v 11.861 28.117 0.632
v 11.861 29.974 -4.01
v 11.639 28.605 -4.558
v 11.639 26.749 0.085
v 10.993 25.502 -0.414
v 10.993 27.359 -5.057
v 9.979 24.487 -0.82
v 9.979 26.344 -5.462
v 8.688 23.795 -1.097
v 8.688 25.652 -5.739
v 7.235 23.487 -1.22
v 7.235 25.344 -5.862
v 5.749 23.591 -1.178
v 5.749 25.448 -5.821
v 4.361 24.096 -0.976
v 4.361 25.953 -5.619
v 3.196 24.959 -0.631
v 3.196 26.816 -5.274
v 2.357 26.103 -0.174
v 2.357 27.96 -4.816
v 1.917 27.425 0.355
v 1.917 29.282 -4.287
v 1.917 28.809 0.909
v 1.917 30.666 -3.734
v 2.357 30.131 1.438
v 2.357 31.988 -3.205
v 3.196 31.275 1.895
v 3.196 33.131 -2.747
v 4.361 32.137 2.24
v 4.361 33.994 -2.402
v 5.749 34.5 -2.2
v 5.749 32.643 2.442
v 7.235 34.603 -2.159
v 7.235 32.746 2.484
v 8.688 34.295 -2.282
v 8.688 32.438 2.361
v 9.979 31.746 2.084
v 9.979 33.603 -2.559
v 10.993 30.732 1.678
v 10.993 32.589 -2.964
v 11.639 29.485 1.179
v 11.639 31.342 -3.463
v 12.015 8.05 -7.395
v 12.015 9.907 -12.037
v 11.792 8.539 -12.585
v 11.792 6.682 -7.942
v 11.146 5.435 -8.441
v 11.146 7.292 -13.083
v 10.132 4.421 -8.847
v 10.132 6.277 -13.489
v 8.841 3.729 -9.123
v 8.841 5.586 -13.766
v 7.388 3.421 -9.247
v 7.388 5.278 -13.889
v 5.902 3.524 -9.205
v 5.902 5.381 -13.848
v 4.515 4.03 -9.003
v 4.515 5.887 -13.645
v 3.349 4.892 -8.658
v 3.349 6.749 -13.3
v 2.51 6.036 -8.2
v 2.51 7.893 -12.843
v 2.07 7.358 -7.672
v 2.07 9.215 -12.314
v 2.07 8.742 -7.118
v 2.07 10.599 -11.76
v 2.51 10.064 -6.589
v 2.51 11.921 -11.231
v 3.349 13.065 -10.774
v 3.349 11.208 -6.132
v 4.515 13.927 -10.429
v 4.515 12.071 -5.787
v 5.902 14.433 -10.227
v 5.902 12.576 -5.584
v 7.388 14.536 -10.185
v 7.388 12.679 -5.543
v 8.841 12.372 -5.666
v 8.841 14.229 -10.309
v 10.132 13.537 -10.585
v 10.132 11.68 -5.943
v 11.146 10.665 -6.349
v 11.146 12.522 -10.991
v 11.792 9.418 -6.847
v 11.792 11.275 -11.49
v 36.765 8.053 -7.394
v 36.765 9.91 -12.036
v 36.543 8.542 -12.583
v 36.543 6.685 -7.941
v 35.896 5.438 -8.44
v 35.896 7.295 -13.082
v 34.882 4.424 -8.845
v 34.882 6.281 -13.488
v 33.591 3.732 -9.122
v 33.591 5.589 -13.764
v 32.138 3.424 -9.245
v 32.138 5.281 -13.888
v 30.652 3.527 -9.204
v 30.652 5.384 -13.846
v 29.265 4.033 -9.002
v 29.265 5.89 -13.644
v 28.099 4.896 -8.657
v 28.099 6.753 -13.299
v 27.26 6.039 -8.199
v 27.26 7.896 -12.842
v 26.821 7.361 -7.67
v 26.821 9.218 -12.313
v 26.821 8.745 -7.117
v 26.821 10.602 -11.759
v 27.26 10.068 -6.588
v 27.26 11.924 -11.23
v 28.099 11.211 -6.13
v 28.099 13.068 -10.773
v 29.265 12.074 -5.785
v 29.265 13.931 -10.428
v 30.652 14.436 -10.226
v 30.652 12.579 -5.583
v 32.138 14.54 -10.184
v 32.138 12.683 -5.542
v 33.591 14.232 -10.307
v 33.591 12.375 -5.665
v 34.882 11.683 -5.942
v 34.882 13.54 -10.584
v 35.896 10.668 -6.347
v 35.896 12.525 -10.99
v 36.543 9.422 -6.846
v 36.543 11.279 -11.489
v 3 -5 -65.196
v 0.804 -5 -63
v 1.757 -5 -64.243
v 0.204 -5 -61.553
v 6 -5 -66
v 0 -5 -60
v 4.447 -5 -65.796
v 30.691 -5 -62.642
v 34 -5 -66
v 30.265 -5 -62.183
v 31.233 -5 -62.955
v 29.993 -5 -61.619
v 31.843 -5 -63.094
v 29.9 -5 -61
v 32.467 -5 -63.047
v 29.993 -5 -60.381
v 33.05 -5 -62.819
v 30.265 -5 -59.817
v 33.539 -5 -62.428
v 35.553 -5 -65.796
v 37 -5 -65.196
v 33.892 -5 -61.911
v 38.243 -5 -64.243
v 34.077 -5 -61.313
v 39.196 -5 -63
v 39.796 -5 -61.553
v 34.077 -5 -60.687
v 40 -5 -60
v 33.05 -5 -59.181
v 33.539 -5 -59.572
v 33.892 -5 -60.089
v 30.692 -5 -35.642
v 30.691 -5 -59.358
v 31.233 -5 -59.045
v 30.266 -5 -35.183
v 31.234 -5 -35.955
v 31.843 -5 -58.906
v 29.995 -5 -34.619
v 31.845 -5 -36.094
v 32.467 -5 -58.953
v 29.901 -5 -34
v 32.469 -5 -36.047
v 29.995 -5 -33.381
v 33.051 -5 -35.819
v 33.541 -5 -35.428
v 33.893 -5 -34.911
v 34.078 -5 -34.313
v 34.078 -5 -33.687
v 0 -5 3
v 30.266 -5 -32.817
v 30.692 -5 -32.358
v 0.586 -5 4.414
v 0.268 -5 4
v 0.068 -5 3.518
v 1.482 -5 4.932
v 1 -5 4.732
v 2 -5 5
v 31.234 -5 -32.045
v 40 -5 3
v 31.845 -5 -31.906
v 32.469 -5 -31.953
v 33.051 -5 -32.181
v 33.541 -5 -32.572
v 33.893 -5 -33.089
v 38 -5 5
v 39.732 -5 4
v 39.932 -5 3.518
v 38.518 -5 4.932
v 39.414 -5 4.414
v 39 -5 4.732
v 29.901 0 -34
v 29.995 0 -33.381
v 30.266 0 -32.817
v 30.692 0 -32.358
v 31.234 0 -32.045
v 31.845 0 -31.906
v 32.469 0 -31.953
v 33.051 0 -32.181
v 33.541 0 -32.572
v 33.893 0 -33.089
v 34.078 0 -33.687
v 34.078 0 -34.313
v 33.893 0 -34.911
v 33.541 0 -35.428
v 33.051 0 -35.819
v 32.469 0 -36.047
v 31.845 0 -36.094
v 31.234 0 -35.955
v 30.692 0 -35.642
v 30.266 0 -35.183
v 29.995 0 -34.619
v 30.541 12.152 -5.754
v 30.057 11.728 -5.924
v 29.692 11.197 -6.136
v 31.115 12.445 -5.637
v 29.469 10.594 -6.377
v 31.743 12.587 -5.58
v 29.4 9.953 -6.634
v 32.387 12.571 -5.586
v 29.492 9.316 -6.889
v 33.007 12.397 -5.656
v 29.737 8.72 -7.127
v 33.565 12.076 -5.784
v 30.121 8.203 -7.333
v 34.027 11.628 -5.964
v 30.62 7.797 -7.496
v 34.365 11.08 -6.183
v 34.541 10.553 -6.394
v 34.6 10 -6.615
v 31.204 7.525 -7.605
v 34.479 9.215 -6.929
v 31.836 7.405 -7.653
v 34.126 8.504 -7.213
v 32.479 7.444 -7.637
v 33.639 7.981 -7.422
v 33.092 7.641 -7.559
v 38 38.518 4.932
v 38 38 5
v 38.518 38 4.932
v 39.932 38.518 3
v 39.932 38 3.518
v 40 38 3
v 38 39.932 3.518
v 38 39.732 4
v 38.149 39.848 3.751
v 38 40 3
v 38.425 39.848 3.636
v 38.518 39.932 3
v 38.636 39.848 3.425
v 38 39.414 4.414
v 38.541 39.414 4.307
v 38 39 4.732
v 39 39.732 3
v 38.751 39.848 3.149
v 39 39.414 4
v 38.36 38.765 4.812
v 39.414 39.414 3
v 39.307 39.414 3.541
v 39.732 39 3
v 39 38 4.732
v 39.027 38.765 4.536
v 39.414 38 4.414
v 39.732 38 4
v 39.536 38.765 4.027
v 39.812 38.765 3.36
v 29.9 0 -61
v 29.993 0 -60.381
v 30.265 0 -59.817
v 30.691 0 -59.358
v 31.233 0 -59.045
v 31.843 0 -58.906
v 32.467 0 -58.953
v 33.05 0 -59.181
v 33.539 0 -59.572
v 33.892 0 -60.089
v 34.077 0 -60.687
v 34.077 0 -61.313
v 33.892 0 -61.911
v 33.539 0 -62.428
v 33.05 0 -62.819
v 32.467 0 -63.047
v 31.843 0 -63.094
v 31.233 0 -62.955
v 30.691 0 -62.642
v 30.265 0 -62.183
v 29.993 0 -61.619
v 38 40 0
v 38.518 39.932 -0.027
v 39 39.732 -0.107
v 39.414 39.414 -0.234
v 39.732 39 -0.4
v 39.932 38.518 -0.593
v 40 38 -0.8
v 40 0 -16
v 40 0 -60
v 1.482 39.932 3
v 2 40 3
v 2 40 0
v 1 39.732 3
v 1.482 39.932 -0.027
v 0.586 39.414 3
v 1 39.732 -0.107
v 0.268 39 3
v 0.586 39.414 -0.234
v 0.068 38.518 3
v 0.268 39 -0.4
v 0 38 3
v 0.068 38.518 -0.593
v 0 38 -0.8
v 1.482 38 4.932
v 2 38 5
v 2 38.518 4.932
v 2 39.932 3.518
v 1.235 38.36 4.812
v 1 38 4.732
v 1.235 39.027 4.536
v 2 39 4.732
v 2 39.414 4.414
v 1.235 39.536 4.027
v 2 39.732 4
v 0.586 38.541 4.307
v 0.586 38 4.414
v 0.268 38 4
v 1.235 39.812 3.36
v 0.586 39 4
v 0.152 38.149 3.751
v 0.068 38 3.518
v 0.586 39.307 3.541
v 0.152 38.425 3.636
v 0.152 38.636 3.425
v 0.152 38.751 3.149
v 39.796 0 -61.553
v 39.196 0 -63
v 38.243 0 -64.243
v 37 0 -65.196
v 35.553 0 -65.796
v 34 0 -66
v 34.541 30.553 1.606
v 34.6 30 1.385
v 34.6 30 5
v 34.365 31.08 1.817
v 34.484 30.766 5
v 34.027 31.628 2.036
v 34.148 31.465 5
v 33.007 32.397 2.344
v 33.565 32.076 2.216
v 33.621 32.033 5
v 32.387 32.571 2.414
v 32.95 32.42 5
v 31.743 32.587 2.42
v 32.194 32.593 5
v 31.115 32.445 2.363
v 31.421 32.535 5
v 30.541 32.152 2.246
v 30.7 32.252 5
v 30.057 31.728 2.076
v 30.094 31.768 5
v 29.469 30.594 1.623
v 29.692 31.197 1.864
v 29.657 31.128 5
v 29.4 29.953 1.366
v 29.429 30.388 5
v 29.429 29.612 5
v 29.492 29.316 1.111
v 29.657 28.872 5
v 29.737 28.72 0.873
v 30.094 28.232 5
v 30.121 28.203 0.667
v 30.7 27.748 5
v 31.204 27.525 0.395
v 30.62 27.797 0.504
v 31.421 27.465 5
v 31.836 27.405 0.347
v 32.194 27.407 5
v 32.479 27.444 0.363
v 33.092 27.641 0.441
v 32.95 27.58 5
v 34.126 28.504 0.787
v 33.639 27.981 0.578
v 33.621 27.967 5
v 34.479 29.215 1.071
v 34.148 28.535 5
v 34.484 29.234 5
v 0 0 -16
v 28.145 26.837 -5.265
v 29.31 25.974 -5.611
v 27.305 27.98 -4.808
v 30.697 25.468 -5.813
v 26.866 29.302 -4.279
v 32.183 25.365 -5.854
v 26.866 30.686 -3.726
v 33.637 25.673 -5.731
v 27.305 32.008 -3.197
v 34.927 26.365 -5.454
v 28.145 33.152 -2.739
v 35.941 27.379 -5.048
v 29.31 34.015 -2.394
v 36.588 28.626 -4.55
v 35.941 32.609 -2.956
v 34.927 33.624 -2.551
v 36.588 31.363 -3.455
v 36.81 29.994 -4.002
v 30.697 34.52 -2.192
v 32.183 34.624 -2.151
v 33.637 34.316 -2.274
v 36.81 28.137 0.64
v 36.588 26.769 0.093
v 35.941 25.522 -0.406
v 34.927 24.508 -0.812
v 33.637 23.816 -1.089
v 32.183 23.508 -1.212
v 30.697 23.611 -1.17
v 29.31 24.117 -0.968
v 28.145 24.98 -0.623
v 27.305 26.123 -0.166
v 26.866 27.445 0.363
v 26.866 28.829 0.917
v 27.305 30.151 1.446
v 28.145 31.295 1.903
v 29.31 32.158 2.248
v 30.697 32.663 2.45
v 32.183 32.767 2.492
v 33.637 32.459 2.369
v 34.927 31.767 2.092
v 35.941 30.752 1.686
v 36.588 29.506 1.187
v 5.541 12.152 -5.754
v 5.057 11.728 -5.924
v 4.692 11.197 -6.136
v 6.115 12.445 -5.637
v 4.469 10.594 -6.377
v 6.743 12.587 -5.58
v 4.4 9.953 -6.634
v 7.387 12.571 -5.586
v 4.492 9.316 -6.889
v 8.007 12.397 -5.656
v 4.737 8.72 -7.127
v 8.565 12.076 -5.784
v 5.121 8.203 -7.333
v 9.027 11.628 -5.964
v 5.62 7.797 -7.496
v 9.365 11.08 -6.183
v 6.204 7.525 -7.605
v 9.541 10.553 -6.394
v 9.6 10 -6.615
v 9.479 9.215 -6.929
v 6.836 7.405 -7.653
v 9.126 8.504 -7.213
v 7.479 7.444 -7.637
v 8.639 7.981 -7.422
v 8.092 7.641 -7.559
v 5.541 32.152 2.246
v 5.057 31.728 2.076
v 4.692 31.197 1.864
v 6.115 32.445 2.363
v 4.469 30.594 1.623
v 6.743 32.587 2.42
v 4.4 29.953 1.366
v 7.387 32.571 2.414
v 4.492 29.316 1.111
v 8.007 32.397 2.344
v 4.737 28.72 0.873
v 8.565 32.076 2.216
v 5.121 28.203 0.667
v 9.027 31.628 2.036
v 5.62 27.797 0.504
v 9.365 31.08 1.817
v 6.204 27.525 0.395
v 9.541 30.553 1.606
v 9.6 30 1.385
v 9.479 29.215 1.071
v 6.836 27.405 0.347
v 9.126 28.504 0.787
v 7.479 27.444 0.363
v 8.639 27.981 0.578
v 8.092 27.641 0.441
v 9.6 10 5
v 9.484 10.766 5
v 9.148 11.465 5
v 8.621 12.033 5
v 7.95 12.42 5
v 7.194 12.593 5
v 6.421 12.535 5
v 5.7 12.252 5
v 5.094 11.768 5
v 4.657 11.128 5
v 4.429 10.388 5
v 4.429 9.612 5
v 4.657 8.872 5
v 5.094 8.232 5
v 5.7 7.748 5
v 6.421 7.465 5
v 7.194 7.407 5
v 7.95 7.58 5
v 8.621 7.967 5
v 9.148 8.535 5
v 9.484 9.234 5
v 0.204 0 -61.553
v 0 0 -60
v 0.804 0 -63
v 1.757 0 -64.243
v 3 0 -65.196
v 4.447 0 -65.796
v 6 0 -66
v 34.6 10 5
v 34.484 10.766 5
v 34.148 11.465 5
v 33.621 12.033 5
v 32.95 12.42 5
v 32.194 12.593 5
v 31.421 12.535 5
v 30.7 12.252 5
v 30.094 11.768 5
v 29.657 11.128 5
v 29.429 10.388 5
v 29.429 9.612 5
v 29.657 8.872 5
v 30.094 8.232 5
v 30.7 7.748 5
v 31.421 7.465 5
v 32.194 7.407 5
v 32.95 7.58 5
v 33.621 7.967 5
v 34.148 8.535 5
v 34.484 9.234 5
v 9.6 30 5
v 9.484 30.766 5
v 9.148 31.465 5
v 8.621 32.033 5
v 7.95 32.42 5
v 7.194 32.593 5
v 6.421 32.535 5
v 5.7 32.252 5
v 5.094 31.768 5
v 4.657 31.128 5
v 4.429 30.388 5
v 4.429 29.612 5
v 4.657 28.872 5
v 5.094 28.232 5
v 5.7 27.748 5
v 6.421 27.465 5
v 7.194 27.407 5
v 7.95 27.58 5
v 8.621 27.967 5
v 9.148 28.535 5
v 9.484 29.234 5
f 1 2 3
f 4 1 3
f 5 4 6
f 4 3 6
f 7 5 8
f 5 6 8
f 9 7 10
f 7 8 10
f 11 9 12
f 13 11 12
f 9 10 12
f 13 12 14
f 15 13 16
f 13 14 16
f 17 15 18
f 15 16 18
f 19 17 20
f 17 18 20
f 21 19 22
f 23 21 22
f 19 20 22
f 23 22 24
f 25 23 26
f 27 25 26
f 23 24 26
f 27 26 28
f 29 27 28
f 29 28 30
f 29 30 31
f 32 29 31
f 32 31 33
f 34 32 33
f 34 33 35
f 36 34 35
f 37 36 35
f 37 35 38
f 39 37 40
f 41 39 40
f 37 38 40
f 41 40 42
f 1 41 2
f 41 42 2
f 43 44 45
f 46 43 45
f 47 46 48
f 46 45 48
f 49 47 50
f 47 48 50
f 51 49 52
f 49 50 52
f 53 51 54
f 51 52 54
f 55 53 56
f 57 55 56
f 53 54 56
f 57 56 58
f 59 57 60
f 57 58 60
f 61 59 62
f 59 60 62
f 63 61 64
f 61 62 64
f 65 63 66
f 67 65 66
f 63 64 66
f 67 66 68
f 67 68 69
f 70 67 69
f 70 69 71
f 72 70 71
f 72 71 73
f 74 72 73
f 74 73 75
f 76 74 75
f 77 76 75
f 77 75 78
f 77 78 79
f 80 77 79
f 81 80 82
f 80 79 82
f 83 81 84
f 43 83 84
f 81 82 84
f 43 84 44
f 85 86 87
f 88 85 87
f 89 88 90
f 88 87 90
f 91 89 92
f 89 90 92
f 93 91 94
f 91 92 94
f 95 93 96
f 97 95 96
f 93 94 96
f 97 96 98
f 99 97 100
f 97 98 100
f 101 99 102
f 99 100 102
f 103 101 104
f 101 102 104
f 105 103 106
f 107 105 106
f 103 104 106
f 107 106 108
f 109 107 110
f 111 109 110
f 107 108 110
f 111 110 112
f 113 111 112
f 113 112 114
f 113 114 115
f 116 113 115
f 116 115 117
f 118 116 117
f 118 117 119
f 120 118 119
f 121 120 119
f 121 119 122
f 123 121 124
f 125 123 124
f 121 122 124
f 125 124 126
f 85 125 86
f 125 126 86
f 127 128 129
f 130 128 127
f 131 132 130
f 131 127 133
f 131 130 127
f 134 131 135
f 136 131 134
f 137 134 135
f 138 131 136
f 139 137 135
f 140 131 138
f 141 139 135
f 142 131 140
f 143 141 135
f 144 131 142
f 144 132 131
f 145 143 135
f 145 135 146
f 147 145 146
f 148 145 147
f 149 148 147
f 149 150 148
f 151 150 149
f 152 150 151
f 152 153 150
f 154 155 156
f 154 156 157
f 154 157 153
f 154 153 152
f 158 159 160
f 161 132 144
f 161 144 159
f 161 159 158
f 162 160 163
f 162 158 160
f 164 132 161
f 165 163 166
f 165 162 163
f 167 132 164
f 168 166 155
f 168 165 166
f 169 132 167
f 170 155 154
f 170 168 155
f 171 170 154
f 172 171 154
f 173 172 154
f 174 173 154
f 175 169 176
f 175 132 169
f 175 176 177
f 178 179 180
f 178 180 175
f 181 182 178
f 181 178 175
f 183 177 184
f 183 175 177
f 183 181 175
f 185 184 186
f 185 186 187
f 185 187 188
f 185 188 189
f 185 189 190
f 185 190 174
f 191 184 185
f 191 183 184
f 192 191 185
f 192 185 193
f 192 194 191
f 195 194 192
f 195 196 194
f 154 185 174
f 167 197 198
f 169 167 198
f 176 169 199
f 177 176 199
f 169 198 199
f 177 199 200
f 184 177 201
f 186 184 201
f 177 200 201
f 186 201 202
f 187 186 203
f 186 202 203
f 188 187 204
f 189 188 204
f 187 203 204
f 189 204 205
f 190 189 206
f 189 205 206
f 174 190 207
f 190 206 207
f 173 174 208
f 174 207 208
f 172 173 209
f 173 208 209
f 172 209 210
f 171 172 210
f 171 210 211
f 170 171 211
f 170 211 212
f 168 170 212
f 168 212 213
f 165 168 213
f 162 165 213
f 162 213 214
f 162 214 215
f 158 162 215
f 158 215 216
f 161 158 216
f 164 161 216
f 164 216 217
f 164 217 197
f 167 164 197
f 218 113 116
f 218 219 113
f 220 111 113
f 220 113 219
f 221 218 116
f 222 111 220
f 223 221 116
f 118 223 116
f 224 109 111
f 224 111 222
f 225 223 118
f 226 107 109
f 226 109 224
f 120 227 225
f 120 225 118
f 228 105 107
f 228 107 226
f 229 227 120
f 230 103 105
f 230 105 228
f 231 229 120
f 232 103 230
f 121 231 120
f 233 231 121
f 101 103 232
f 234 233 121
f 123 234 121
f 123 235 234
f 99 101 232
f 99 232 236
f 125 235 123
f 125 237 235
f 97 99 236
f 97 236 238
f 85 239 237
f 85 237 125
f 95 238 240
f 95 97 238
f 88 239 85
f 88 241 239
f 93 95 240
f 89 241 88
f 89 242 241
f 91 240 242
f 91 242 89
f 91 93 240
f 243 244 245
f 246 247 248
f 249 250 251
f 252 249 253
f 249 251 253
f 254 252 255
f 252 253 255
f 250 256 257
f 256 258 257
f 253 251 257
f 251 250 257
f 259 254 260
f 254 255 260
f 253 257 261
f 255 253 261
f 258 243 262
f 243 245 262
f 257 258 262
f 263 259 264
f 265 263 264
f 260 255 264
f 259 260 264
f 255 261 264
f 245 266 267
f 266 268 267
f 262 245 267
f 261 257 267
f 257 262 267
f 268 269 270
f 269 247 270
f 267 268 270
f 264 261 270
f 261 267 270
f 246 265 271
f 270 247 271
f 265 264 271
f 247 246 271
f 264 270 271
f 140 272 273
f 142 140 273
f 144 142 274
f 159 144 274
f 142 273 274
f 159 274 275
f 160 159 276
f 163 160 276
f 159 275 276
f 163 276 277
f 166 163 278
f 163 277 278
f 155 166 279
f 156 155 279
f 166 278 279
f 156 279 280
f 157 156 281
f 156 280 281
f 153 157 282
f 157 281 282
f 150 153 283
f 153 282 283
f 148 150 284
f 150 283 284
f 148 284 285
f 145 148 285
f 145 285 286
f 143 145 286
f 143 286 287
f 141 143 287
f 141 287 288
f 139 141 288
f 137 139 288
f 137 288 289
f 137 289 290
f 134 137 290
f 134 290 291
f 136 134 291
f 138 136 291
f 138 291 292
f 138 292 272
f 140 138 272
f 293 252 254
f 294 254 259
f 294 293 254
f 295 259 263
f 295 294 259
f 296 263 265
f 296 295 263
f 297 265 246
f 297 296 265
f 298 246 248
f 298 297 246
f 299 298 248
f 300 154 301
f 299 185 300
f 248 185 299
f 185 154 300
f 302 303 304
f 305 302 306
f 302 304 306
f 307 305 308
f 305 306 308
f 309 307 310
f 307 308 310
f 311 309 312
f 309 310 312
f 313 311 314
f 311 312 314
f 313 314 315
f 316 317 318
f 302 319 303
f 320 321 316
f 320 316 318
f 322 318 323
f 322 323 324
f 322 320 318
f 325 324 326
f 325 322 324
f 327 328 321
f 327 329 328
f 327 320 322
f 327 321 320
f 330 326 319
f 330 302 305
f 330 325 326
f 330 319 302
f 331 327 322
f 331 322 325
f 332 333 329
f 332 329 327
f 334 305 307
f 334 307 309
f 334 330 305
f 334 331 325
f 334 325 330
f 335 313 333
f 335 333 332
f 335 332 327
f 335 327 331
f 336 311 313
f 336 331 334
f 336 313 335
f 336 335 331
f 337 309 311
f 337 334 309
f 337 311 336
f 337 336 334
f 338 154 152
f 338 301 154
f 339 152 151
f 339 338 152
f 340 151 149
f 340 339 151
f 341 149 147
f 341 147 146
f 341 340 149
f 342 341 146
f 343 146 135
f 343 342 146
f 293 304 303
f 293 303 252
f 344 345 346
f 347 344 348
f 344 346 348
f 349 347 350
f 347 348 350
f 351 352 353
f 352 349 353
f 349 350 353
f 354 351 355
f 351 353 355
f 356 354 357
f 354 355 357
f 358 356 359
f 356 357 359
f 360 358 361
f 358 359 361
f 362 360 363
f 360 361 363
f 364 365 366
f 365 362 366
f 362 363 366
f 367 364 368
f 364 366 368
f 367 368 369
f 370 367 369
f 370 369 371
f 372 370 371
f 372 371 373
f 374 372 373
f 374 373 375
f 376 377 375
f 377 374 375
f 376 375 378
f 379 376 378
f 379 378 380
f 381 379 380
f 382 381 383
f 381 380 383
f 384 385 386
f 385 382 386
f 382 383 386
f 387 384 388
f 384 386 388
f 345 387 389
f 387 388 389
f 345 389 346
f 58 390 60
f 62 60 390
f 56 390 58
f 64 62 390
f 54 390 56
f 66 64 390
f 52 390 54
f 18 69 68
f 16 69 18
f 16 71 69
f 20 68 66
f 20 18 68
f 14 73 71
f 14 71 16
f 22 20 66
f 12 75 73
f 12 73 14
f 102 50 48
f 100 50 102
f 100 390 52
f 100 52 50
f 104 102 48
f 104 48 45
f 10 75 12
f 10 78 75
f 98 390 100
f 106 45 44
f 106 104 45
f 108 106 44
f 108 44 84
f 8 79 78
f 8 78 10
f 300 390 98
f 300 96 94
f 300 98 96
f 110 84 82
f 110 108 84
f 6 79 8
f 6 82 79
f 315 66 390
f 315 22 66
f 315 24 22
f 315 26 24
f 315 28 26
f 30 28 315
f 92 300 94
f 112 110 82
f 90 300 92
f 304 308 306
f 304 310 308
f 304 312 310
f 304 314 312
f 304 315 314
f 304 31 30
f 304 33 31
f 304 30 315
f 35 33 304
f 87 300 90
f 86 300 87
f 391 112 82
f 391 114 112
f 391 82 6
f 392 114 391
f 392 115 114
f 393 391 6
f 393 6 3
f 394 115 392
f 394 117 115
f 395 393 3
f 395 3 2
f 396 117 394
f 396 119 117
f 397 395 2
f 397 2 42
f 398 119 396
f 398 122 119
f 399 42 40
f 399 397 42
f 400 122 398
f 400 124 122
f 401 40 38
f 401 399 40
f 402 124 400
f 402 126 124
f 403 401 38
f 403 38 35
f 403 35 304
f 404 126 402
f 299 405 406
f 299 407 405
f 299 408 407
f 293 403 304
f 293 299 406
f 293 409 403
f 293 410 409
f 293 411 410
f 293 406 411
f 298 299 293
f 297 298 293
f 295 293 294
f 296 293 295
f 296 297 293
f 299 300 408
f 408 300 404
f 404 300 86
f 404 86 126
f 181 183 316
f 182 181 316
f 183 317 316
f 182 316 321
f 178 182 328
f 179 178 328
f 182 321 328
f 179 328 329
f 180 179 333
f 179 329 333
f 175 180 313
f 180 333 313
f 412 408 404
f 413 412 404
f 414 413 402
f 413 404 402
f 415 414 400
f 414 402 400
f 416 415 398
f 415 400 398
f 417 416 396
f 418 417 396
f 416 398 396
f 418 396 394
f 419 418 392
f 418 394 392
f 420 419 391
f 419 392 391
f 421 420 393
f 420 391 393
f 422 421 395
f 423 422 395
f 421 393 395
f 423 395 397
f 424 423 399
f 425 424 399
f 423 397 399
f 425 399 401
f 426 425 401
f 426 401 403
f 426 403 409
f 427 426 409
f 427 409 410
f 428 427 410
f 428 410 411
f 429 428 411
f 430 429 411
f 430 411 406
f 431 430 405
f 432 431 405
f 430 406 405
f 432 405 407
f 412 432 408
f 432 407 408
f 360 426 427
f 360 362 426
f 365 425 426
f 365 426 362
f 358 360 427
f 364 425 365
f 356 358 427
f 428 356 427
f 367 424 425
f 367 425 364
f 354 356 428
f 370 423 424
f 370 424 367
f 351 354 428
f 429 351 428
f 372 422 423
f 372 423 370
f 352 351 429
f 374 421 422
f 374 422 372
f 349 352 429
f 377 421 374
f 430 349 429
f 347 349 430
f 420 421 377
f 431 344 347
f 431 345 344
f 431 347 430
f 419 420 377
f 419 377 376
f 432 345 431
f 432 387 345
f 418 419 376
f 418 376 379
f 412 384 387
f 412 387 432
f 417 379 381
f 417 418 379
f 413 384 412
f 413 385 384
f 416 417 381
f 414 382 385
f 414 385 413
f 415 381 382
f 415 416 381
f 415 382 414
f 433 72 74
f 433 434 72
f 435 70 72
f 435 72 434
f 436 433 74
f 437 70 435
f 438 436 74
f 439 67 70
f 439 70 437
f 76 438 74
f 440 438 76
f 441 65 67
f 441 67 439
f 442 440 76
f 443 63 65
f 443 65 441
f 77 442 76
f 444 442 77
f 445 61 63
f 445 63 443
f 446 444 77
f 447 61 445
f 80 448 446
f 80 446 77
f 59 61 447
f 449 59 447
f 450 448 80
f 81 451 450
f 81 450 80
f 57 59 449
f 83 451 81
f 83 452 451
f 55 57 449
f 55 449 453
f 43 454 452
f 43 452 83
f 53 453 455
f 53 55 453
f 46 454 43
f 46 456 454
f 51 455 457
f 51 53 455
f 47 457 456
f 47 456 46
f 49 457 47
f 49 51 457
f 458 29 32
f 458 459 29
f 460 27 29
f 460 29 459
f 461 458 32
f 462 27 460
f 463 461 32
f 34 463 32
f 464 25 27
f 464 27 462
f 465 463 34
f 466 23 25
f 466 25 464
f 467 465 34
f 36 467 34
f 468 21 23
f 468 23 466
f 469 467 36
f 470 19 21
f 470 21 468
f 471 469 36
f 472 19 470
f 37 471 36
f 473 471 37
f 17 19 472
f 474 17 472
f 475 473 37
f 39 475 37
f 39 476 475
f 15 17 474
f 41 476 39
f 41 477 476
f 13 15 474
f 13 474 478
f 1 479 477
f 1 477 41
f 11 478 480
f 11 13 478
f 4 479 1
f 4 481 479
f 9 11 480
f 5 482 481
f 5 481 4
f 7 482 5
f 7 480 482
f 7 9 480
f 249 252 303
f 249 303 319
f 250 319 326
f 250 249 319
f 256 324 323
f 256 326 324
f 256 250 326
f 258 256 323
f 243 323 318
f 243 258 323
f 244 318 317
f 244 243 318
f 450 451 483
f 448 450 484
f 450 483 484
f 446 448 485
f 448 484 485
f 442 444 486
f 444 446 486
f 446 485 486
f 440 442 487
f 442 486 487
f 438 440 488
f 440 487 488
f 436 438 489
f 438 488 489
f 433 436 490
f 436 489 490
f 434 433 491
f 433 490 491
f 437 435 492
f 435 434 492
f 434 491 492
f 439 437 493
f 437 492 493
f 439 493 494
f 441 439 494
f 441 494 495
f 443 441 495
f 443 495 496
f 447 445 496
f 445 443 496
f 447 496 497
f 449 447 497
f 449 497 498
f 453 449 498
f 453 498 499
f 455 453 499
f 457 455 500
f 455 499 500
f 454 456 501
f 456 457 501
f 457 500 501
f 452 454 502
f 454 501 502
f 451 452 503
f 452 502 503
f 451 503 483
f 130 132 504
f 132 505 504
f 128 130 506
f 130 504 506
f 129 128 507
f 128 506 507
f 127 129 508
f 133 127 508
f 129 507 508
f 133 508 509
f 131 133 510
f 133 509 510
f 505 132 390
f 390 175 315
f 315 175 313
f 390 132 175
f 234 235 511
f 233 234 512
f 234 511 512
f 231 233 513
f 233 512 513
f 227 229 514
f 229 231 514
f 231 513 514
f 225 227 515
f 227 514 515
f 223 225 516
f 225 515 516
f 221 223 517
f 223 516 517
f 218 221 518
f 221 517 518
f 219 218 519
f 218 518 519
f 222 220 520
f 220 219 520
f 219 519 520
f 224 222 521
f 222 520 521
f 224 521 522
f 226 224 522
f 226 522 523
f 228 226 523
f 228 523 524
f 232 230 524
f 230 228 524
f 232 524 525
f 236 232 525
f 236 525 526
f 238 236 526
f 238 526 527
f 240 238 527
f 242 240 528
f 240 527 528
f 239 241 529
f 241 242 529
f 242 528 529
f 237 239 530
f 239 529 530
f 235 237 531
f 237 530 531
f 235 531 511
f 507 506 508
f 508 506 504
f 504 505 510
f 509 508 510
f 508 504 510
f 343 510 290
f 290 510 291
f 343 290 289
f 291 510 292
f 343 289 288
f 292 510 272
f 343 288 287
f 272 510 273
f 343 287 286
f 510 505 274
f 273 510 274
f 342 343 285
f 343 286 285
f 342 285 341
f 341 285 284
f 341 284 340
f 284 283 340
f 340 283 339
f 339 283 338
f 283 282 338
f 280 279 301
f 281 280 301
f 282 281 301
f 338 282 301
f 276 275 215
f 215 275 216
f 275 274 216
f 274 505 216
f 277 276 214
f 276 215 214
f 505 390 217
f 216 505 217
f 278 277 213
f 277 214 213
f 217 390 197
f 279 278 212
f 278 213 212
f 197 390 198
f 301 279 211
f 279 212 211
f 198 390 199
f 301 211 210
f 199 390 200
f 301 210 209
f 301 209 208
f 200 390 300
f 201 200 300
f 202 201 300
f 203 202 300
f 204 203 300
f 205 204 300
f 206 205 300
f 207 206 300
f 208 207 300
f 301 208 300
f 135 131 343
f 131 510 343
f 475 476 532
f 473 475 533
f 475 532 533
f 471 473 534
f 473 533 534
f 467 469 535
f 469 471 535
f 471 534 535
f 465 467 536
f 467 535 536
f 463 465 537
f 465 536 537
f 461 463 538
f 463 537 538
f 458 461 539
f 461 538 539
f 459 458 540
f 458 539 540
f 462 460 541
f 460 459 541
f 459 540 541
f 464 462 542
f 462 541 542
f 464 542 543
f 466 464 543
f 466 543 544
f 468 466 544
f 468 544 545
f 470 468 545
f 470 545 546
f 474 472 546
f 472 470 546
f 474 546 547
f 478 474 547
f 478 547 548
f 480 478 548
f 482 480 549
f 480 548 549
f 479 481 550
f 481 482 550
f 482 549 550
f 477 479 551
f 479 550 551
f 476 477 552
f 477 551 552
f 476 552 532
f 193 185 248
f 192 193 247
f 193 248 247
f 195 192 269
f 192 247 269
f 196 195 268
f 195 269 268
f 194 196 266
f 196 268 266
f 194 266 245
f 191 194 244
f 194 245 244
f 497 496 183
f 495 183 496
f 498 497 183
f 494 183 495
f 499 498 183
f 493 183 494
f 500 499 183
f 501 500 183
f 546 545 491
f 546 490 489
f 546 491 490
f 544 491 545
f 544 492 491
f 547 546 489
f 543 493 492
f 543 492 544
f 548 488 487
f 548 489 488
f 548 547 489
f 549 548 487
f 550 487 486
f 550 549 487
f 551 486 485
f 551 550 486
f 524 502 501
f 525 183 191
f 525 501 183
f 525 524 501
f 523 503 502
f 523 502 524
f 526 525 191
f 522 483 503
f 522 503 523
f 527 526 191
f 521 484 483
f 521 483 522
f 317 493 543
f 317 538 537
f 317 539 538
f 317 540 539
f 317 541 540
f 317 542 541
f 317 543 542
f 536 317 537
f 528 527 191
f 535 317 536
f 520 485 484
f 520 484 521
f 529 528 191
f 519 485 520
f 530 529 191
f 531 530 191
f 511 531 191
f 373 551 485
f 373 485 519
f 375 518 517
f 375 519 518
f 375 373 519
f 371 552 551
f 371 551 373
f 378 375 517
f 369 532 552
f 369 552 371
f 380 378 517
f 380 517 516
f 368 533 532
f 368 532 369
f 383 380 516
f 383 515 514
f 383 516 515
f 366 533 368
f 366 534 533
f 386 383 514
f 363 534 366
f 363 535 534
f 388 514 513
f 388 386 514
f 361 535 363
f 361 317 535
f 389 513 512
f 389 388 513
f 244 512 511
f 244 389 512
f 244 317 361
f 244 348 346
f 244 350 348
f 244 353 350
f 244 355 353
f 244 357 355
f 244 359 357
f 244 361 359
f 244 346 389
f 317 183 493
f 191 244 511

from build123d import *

# Parameters (mm, degrees)
SKETCH_W        = 40
SKETCH_H        = 40
PAD_DEPTH       = 5
SKETCH001_W     = 40
SKETCH001_H     = 5
PAD001_DEPTH    = 71
PAD002_DEPTH    = 40
SKETCH004_R     = 2.1
POCKET_DEPTH    = 10
SKETCH008_R     = 2.6
POCKET002_DEPTH = 30
SKETCH009_R     = 5
POCKET003_DEPTH = 5
FILLET_R        = 2
FILLET001_R     = 2
FILLET002_R     = 2
FILLET003_R     = 6


with BuildPart() as part:
    # Sketch → Pad (new body)
    with BuildSketch(Plane.XY):
        with Locations((20, 20)):
            Rectangle(SKETCH_W, SKETCH_H)
    extrude(amount=PAD_DEPTH)

    # Sketch001 (on DatumPlane) → Pad001 (join)
    with BuildSketch(Plane.XY.offset(5)):
        with Locations((20, -2.5)):
            Rectangle(SKETCH001_W, SKETCH001_H)
    extrude(amount=-PAD001_DEPTH)

    # Sketch002 (on DatumPlane) → Pad002 (join)
    with BuildSketch(Plane.YZ.offset(40)):
        Polygon((40, 0), (0, 0), (0, -16), align=None)
    extrude(amount=-PAD002_DEPTH)

    # Sketch004 → Pocket (cut)
    with BuildSketch(Plane(origin=(0, 0, 0), x_dir=(-1, 0, 0), z_dir=(0, 1, 0))):
        with Locations((-32, -61)):
            Circle(SKETCH004_R)
        with Locations((-32.0014529651, -34.0000000391)):
            Circle(SKETCH004_R)
    extrude(amount=-POCKET_DEPTH, mode=Mode.SUBTRACT)

    # Sketch008 → Pocket002 (cut)
    with BuildSketch(Plane.XY.offset(5)):
        with Locations((7, 10)):
            Circle(SKETCH008_R)
        with Locations((32, 10)):
            Circle(SKETCH008_R)
        with Locations((32, 30)):
            Circle(SKETCH008_R)
        with Locations((7, 30)):
            Circle(SKETCH008_R)
    extrude(amount=-POCKET002_DEPTH, mode=Mode.SUBTRACT)

    # Sketch009 (on DatumPlane) → Pocket003 (cut)
    with BuildSketch(Plane(origin=(0, 5.5172413793, -13.7931034483), x_dir=(1, 0, 0), z_dir=(0, 0.3713906764, -0.9284766909))):
        with Locations((7.014635, -4.727969)):
            Circle(SKETCH009_R)
        with Locations((31.764727, -4.731389)):
            Circle(SKETCH009_R)
        with Locations((31.809804, -26.362438)):
            Circle(SKETCH009_R)
        with Locations((6.861452, -26.34057)):
            Circle(SKETCH009_R)
    extrude(amount=-POCKET003_DEPTH, mode=Mode.SUBTRACT)

    # Fillet
    fillet_edges = [part.edges().sort_by_distance(p)[0] for p in [
        (40, 20, 5),
    ]]
    fillet(fillet_edges, radius=FILLET_R)

    # Fillet001
    fillet001_edges = [part.edges().sort_by_distance(p)[0] for p in [
        (19, 40, 5),
    ]]
    fillet(fillet001_edges, radius=FILLET001_R)

    # Fillet002
    fillet002_edges = [part.edges().sort_by_distance(p)[0] for p in [
        (0, 19, 5),
    ]]
    fillet(fillet002_edges, radius=FILLET002_R)

    # Fillet003
    fillet003_edges = [part.edges().sort_by_distance(p)[0] for p in [
        (40, -2.5, -66),
        (0, -2.5, -66),
    ]]
    fillet(fillet003_edges, radius=FILLET003_R)


solid = part.part
